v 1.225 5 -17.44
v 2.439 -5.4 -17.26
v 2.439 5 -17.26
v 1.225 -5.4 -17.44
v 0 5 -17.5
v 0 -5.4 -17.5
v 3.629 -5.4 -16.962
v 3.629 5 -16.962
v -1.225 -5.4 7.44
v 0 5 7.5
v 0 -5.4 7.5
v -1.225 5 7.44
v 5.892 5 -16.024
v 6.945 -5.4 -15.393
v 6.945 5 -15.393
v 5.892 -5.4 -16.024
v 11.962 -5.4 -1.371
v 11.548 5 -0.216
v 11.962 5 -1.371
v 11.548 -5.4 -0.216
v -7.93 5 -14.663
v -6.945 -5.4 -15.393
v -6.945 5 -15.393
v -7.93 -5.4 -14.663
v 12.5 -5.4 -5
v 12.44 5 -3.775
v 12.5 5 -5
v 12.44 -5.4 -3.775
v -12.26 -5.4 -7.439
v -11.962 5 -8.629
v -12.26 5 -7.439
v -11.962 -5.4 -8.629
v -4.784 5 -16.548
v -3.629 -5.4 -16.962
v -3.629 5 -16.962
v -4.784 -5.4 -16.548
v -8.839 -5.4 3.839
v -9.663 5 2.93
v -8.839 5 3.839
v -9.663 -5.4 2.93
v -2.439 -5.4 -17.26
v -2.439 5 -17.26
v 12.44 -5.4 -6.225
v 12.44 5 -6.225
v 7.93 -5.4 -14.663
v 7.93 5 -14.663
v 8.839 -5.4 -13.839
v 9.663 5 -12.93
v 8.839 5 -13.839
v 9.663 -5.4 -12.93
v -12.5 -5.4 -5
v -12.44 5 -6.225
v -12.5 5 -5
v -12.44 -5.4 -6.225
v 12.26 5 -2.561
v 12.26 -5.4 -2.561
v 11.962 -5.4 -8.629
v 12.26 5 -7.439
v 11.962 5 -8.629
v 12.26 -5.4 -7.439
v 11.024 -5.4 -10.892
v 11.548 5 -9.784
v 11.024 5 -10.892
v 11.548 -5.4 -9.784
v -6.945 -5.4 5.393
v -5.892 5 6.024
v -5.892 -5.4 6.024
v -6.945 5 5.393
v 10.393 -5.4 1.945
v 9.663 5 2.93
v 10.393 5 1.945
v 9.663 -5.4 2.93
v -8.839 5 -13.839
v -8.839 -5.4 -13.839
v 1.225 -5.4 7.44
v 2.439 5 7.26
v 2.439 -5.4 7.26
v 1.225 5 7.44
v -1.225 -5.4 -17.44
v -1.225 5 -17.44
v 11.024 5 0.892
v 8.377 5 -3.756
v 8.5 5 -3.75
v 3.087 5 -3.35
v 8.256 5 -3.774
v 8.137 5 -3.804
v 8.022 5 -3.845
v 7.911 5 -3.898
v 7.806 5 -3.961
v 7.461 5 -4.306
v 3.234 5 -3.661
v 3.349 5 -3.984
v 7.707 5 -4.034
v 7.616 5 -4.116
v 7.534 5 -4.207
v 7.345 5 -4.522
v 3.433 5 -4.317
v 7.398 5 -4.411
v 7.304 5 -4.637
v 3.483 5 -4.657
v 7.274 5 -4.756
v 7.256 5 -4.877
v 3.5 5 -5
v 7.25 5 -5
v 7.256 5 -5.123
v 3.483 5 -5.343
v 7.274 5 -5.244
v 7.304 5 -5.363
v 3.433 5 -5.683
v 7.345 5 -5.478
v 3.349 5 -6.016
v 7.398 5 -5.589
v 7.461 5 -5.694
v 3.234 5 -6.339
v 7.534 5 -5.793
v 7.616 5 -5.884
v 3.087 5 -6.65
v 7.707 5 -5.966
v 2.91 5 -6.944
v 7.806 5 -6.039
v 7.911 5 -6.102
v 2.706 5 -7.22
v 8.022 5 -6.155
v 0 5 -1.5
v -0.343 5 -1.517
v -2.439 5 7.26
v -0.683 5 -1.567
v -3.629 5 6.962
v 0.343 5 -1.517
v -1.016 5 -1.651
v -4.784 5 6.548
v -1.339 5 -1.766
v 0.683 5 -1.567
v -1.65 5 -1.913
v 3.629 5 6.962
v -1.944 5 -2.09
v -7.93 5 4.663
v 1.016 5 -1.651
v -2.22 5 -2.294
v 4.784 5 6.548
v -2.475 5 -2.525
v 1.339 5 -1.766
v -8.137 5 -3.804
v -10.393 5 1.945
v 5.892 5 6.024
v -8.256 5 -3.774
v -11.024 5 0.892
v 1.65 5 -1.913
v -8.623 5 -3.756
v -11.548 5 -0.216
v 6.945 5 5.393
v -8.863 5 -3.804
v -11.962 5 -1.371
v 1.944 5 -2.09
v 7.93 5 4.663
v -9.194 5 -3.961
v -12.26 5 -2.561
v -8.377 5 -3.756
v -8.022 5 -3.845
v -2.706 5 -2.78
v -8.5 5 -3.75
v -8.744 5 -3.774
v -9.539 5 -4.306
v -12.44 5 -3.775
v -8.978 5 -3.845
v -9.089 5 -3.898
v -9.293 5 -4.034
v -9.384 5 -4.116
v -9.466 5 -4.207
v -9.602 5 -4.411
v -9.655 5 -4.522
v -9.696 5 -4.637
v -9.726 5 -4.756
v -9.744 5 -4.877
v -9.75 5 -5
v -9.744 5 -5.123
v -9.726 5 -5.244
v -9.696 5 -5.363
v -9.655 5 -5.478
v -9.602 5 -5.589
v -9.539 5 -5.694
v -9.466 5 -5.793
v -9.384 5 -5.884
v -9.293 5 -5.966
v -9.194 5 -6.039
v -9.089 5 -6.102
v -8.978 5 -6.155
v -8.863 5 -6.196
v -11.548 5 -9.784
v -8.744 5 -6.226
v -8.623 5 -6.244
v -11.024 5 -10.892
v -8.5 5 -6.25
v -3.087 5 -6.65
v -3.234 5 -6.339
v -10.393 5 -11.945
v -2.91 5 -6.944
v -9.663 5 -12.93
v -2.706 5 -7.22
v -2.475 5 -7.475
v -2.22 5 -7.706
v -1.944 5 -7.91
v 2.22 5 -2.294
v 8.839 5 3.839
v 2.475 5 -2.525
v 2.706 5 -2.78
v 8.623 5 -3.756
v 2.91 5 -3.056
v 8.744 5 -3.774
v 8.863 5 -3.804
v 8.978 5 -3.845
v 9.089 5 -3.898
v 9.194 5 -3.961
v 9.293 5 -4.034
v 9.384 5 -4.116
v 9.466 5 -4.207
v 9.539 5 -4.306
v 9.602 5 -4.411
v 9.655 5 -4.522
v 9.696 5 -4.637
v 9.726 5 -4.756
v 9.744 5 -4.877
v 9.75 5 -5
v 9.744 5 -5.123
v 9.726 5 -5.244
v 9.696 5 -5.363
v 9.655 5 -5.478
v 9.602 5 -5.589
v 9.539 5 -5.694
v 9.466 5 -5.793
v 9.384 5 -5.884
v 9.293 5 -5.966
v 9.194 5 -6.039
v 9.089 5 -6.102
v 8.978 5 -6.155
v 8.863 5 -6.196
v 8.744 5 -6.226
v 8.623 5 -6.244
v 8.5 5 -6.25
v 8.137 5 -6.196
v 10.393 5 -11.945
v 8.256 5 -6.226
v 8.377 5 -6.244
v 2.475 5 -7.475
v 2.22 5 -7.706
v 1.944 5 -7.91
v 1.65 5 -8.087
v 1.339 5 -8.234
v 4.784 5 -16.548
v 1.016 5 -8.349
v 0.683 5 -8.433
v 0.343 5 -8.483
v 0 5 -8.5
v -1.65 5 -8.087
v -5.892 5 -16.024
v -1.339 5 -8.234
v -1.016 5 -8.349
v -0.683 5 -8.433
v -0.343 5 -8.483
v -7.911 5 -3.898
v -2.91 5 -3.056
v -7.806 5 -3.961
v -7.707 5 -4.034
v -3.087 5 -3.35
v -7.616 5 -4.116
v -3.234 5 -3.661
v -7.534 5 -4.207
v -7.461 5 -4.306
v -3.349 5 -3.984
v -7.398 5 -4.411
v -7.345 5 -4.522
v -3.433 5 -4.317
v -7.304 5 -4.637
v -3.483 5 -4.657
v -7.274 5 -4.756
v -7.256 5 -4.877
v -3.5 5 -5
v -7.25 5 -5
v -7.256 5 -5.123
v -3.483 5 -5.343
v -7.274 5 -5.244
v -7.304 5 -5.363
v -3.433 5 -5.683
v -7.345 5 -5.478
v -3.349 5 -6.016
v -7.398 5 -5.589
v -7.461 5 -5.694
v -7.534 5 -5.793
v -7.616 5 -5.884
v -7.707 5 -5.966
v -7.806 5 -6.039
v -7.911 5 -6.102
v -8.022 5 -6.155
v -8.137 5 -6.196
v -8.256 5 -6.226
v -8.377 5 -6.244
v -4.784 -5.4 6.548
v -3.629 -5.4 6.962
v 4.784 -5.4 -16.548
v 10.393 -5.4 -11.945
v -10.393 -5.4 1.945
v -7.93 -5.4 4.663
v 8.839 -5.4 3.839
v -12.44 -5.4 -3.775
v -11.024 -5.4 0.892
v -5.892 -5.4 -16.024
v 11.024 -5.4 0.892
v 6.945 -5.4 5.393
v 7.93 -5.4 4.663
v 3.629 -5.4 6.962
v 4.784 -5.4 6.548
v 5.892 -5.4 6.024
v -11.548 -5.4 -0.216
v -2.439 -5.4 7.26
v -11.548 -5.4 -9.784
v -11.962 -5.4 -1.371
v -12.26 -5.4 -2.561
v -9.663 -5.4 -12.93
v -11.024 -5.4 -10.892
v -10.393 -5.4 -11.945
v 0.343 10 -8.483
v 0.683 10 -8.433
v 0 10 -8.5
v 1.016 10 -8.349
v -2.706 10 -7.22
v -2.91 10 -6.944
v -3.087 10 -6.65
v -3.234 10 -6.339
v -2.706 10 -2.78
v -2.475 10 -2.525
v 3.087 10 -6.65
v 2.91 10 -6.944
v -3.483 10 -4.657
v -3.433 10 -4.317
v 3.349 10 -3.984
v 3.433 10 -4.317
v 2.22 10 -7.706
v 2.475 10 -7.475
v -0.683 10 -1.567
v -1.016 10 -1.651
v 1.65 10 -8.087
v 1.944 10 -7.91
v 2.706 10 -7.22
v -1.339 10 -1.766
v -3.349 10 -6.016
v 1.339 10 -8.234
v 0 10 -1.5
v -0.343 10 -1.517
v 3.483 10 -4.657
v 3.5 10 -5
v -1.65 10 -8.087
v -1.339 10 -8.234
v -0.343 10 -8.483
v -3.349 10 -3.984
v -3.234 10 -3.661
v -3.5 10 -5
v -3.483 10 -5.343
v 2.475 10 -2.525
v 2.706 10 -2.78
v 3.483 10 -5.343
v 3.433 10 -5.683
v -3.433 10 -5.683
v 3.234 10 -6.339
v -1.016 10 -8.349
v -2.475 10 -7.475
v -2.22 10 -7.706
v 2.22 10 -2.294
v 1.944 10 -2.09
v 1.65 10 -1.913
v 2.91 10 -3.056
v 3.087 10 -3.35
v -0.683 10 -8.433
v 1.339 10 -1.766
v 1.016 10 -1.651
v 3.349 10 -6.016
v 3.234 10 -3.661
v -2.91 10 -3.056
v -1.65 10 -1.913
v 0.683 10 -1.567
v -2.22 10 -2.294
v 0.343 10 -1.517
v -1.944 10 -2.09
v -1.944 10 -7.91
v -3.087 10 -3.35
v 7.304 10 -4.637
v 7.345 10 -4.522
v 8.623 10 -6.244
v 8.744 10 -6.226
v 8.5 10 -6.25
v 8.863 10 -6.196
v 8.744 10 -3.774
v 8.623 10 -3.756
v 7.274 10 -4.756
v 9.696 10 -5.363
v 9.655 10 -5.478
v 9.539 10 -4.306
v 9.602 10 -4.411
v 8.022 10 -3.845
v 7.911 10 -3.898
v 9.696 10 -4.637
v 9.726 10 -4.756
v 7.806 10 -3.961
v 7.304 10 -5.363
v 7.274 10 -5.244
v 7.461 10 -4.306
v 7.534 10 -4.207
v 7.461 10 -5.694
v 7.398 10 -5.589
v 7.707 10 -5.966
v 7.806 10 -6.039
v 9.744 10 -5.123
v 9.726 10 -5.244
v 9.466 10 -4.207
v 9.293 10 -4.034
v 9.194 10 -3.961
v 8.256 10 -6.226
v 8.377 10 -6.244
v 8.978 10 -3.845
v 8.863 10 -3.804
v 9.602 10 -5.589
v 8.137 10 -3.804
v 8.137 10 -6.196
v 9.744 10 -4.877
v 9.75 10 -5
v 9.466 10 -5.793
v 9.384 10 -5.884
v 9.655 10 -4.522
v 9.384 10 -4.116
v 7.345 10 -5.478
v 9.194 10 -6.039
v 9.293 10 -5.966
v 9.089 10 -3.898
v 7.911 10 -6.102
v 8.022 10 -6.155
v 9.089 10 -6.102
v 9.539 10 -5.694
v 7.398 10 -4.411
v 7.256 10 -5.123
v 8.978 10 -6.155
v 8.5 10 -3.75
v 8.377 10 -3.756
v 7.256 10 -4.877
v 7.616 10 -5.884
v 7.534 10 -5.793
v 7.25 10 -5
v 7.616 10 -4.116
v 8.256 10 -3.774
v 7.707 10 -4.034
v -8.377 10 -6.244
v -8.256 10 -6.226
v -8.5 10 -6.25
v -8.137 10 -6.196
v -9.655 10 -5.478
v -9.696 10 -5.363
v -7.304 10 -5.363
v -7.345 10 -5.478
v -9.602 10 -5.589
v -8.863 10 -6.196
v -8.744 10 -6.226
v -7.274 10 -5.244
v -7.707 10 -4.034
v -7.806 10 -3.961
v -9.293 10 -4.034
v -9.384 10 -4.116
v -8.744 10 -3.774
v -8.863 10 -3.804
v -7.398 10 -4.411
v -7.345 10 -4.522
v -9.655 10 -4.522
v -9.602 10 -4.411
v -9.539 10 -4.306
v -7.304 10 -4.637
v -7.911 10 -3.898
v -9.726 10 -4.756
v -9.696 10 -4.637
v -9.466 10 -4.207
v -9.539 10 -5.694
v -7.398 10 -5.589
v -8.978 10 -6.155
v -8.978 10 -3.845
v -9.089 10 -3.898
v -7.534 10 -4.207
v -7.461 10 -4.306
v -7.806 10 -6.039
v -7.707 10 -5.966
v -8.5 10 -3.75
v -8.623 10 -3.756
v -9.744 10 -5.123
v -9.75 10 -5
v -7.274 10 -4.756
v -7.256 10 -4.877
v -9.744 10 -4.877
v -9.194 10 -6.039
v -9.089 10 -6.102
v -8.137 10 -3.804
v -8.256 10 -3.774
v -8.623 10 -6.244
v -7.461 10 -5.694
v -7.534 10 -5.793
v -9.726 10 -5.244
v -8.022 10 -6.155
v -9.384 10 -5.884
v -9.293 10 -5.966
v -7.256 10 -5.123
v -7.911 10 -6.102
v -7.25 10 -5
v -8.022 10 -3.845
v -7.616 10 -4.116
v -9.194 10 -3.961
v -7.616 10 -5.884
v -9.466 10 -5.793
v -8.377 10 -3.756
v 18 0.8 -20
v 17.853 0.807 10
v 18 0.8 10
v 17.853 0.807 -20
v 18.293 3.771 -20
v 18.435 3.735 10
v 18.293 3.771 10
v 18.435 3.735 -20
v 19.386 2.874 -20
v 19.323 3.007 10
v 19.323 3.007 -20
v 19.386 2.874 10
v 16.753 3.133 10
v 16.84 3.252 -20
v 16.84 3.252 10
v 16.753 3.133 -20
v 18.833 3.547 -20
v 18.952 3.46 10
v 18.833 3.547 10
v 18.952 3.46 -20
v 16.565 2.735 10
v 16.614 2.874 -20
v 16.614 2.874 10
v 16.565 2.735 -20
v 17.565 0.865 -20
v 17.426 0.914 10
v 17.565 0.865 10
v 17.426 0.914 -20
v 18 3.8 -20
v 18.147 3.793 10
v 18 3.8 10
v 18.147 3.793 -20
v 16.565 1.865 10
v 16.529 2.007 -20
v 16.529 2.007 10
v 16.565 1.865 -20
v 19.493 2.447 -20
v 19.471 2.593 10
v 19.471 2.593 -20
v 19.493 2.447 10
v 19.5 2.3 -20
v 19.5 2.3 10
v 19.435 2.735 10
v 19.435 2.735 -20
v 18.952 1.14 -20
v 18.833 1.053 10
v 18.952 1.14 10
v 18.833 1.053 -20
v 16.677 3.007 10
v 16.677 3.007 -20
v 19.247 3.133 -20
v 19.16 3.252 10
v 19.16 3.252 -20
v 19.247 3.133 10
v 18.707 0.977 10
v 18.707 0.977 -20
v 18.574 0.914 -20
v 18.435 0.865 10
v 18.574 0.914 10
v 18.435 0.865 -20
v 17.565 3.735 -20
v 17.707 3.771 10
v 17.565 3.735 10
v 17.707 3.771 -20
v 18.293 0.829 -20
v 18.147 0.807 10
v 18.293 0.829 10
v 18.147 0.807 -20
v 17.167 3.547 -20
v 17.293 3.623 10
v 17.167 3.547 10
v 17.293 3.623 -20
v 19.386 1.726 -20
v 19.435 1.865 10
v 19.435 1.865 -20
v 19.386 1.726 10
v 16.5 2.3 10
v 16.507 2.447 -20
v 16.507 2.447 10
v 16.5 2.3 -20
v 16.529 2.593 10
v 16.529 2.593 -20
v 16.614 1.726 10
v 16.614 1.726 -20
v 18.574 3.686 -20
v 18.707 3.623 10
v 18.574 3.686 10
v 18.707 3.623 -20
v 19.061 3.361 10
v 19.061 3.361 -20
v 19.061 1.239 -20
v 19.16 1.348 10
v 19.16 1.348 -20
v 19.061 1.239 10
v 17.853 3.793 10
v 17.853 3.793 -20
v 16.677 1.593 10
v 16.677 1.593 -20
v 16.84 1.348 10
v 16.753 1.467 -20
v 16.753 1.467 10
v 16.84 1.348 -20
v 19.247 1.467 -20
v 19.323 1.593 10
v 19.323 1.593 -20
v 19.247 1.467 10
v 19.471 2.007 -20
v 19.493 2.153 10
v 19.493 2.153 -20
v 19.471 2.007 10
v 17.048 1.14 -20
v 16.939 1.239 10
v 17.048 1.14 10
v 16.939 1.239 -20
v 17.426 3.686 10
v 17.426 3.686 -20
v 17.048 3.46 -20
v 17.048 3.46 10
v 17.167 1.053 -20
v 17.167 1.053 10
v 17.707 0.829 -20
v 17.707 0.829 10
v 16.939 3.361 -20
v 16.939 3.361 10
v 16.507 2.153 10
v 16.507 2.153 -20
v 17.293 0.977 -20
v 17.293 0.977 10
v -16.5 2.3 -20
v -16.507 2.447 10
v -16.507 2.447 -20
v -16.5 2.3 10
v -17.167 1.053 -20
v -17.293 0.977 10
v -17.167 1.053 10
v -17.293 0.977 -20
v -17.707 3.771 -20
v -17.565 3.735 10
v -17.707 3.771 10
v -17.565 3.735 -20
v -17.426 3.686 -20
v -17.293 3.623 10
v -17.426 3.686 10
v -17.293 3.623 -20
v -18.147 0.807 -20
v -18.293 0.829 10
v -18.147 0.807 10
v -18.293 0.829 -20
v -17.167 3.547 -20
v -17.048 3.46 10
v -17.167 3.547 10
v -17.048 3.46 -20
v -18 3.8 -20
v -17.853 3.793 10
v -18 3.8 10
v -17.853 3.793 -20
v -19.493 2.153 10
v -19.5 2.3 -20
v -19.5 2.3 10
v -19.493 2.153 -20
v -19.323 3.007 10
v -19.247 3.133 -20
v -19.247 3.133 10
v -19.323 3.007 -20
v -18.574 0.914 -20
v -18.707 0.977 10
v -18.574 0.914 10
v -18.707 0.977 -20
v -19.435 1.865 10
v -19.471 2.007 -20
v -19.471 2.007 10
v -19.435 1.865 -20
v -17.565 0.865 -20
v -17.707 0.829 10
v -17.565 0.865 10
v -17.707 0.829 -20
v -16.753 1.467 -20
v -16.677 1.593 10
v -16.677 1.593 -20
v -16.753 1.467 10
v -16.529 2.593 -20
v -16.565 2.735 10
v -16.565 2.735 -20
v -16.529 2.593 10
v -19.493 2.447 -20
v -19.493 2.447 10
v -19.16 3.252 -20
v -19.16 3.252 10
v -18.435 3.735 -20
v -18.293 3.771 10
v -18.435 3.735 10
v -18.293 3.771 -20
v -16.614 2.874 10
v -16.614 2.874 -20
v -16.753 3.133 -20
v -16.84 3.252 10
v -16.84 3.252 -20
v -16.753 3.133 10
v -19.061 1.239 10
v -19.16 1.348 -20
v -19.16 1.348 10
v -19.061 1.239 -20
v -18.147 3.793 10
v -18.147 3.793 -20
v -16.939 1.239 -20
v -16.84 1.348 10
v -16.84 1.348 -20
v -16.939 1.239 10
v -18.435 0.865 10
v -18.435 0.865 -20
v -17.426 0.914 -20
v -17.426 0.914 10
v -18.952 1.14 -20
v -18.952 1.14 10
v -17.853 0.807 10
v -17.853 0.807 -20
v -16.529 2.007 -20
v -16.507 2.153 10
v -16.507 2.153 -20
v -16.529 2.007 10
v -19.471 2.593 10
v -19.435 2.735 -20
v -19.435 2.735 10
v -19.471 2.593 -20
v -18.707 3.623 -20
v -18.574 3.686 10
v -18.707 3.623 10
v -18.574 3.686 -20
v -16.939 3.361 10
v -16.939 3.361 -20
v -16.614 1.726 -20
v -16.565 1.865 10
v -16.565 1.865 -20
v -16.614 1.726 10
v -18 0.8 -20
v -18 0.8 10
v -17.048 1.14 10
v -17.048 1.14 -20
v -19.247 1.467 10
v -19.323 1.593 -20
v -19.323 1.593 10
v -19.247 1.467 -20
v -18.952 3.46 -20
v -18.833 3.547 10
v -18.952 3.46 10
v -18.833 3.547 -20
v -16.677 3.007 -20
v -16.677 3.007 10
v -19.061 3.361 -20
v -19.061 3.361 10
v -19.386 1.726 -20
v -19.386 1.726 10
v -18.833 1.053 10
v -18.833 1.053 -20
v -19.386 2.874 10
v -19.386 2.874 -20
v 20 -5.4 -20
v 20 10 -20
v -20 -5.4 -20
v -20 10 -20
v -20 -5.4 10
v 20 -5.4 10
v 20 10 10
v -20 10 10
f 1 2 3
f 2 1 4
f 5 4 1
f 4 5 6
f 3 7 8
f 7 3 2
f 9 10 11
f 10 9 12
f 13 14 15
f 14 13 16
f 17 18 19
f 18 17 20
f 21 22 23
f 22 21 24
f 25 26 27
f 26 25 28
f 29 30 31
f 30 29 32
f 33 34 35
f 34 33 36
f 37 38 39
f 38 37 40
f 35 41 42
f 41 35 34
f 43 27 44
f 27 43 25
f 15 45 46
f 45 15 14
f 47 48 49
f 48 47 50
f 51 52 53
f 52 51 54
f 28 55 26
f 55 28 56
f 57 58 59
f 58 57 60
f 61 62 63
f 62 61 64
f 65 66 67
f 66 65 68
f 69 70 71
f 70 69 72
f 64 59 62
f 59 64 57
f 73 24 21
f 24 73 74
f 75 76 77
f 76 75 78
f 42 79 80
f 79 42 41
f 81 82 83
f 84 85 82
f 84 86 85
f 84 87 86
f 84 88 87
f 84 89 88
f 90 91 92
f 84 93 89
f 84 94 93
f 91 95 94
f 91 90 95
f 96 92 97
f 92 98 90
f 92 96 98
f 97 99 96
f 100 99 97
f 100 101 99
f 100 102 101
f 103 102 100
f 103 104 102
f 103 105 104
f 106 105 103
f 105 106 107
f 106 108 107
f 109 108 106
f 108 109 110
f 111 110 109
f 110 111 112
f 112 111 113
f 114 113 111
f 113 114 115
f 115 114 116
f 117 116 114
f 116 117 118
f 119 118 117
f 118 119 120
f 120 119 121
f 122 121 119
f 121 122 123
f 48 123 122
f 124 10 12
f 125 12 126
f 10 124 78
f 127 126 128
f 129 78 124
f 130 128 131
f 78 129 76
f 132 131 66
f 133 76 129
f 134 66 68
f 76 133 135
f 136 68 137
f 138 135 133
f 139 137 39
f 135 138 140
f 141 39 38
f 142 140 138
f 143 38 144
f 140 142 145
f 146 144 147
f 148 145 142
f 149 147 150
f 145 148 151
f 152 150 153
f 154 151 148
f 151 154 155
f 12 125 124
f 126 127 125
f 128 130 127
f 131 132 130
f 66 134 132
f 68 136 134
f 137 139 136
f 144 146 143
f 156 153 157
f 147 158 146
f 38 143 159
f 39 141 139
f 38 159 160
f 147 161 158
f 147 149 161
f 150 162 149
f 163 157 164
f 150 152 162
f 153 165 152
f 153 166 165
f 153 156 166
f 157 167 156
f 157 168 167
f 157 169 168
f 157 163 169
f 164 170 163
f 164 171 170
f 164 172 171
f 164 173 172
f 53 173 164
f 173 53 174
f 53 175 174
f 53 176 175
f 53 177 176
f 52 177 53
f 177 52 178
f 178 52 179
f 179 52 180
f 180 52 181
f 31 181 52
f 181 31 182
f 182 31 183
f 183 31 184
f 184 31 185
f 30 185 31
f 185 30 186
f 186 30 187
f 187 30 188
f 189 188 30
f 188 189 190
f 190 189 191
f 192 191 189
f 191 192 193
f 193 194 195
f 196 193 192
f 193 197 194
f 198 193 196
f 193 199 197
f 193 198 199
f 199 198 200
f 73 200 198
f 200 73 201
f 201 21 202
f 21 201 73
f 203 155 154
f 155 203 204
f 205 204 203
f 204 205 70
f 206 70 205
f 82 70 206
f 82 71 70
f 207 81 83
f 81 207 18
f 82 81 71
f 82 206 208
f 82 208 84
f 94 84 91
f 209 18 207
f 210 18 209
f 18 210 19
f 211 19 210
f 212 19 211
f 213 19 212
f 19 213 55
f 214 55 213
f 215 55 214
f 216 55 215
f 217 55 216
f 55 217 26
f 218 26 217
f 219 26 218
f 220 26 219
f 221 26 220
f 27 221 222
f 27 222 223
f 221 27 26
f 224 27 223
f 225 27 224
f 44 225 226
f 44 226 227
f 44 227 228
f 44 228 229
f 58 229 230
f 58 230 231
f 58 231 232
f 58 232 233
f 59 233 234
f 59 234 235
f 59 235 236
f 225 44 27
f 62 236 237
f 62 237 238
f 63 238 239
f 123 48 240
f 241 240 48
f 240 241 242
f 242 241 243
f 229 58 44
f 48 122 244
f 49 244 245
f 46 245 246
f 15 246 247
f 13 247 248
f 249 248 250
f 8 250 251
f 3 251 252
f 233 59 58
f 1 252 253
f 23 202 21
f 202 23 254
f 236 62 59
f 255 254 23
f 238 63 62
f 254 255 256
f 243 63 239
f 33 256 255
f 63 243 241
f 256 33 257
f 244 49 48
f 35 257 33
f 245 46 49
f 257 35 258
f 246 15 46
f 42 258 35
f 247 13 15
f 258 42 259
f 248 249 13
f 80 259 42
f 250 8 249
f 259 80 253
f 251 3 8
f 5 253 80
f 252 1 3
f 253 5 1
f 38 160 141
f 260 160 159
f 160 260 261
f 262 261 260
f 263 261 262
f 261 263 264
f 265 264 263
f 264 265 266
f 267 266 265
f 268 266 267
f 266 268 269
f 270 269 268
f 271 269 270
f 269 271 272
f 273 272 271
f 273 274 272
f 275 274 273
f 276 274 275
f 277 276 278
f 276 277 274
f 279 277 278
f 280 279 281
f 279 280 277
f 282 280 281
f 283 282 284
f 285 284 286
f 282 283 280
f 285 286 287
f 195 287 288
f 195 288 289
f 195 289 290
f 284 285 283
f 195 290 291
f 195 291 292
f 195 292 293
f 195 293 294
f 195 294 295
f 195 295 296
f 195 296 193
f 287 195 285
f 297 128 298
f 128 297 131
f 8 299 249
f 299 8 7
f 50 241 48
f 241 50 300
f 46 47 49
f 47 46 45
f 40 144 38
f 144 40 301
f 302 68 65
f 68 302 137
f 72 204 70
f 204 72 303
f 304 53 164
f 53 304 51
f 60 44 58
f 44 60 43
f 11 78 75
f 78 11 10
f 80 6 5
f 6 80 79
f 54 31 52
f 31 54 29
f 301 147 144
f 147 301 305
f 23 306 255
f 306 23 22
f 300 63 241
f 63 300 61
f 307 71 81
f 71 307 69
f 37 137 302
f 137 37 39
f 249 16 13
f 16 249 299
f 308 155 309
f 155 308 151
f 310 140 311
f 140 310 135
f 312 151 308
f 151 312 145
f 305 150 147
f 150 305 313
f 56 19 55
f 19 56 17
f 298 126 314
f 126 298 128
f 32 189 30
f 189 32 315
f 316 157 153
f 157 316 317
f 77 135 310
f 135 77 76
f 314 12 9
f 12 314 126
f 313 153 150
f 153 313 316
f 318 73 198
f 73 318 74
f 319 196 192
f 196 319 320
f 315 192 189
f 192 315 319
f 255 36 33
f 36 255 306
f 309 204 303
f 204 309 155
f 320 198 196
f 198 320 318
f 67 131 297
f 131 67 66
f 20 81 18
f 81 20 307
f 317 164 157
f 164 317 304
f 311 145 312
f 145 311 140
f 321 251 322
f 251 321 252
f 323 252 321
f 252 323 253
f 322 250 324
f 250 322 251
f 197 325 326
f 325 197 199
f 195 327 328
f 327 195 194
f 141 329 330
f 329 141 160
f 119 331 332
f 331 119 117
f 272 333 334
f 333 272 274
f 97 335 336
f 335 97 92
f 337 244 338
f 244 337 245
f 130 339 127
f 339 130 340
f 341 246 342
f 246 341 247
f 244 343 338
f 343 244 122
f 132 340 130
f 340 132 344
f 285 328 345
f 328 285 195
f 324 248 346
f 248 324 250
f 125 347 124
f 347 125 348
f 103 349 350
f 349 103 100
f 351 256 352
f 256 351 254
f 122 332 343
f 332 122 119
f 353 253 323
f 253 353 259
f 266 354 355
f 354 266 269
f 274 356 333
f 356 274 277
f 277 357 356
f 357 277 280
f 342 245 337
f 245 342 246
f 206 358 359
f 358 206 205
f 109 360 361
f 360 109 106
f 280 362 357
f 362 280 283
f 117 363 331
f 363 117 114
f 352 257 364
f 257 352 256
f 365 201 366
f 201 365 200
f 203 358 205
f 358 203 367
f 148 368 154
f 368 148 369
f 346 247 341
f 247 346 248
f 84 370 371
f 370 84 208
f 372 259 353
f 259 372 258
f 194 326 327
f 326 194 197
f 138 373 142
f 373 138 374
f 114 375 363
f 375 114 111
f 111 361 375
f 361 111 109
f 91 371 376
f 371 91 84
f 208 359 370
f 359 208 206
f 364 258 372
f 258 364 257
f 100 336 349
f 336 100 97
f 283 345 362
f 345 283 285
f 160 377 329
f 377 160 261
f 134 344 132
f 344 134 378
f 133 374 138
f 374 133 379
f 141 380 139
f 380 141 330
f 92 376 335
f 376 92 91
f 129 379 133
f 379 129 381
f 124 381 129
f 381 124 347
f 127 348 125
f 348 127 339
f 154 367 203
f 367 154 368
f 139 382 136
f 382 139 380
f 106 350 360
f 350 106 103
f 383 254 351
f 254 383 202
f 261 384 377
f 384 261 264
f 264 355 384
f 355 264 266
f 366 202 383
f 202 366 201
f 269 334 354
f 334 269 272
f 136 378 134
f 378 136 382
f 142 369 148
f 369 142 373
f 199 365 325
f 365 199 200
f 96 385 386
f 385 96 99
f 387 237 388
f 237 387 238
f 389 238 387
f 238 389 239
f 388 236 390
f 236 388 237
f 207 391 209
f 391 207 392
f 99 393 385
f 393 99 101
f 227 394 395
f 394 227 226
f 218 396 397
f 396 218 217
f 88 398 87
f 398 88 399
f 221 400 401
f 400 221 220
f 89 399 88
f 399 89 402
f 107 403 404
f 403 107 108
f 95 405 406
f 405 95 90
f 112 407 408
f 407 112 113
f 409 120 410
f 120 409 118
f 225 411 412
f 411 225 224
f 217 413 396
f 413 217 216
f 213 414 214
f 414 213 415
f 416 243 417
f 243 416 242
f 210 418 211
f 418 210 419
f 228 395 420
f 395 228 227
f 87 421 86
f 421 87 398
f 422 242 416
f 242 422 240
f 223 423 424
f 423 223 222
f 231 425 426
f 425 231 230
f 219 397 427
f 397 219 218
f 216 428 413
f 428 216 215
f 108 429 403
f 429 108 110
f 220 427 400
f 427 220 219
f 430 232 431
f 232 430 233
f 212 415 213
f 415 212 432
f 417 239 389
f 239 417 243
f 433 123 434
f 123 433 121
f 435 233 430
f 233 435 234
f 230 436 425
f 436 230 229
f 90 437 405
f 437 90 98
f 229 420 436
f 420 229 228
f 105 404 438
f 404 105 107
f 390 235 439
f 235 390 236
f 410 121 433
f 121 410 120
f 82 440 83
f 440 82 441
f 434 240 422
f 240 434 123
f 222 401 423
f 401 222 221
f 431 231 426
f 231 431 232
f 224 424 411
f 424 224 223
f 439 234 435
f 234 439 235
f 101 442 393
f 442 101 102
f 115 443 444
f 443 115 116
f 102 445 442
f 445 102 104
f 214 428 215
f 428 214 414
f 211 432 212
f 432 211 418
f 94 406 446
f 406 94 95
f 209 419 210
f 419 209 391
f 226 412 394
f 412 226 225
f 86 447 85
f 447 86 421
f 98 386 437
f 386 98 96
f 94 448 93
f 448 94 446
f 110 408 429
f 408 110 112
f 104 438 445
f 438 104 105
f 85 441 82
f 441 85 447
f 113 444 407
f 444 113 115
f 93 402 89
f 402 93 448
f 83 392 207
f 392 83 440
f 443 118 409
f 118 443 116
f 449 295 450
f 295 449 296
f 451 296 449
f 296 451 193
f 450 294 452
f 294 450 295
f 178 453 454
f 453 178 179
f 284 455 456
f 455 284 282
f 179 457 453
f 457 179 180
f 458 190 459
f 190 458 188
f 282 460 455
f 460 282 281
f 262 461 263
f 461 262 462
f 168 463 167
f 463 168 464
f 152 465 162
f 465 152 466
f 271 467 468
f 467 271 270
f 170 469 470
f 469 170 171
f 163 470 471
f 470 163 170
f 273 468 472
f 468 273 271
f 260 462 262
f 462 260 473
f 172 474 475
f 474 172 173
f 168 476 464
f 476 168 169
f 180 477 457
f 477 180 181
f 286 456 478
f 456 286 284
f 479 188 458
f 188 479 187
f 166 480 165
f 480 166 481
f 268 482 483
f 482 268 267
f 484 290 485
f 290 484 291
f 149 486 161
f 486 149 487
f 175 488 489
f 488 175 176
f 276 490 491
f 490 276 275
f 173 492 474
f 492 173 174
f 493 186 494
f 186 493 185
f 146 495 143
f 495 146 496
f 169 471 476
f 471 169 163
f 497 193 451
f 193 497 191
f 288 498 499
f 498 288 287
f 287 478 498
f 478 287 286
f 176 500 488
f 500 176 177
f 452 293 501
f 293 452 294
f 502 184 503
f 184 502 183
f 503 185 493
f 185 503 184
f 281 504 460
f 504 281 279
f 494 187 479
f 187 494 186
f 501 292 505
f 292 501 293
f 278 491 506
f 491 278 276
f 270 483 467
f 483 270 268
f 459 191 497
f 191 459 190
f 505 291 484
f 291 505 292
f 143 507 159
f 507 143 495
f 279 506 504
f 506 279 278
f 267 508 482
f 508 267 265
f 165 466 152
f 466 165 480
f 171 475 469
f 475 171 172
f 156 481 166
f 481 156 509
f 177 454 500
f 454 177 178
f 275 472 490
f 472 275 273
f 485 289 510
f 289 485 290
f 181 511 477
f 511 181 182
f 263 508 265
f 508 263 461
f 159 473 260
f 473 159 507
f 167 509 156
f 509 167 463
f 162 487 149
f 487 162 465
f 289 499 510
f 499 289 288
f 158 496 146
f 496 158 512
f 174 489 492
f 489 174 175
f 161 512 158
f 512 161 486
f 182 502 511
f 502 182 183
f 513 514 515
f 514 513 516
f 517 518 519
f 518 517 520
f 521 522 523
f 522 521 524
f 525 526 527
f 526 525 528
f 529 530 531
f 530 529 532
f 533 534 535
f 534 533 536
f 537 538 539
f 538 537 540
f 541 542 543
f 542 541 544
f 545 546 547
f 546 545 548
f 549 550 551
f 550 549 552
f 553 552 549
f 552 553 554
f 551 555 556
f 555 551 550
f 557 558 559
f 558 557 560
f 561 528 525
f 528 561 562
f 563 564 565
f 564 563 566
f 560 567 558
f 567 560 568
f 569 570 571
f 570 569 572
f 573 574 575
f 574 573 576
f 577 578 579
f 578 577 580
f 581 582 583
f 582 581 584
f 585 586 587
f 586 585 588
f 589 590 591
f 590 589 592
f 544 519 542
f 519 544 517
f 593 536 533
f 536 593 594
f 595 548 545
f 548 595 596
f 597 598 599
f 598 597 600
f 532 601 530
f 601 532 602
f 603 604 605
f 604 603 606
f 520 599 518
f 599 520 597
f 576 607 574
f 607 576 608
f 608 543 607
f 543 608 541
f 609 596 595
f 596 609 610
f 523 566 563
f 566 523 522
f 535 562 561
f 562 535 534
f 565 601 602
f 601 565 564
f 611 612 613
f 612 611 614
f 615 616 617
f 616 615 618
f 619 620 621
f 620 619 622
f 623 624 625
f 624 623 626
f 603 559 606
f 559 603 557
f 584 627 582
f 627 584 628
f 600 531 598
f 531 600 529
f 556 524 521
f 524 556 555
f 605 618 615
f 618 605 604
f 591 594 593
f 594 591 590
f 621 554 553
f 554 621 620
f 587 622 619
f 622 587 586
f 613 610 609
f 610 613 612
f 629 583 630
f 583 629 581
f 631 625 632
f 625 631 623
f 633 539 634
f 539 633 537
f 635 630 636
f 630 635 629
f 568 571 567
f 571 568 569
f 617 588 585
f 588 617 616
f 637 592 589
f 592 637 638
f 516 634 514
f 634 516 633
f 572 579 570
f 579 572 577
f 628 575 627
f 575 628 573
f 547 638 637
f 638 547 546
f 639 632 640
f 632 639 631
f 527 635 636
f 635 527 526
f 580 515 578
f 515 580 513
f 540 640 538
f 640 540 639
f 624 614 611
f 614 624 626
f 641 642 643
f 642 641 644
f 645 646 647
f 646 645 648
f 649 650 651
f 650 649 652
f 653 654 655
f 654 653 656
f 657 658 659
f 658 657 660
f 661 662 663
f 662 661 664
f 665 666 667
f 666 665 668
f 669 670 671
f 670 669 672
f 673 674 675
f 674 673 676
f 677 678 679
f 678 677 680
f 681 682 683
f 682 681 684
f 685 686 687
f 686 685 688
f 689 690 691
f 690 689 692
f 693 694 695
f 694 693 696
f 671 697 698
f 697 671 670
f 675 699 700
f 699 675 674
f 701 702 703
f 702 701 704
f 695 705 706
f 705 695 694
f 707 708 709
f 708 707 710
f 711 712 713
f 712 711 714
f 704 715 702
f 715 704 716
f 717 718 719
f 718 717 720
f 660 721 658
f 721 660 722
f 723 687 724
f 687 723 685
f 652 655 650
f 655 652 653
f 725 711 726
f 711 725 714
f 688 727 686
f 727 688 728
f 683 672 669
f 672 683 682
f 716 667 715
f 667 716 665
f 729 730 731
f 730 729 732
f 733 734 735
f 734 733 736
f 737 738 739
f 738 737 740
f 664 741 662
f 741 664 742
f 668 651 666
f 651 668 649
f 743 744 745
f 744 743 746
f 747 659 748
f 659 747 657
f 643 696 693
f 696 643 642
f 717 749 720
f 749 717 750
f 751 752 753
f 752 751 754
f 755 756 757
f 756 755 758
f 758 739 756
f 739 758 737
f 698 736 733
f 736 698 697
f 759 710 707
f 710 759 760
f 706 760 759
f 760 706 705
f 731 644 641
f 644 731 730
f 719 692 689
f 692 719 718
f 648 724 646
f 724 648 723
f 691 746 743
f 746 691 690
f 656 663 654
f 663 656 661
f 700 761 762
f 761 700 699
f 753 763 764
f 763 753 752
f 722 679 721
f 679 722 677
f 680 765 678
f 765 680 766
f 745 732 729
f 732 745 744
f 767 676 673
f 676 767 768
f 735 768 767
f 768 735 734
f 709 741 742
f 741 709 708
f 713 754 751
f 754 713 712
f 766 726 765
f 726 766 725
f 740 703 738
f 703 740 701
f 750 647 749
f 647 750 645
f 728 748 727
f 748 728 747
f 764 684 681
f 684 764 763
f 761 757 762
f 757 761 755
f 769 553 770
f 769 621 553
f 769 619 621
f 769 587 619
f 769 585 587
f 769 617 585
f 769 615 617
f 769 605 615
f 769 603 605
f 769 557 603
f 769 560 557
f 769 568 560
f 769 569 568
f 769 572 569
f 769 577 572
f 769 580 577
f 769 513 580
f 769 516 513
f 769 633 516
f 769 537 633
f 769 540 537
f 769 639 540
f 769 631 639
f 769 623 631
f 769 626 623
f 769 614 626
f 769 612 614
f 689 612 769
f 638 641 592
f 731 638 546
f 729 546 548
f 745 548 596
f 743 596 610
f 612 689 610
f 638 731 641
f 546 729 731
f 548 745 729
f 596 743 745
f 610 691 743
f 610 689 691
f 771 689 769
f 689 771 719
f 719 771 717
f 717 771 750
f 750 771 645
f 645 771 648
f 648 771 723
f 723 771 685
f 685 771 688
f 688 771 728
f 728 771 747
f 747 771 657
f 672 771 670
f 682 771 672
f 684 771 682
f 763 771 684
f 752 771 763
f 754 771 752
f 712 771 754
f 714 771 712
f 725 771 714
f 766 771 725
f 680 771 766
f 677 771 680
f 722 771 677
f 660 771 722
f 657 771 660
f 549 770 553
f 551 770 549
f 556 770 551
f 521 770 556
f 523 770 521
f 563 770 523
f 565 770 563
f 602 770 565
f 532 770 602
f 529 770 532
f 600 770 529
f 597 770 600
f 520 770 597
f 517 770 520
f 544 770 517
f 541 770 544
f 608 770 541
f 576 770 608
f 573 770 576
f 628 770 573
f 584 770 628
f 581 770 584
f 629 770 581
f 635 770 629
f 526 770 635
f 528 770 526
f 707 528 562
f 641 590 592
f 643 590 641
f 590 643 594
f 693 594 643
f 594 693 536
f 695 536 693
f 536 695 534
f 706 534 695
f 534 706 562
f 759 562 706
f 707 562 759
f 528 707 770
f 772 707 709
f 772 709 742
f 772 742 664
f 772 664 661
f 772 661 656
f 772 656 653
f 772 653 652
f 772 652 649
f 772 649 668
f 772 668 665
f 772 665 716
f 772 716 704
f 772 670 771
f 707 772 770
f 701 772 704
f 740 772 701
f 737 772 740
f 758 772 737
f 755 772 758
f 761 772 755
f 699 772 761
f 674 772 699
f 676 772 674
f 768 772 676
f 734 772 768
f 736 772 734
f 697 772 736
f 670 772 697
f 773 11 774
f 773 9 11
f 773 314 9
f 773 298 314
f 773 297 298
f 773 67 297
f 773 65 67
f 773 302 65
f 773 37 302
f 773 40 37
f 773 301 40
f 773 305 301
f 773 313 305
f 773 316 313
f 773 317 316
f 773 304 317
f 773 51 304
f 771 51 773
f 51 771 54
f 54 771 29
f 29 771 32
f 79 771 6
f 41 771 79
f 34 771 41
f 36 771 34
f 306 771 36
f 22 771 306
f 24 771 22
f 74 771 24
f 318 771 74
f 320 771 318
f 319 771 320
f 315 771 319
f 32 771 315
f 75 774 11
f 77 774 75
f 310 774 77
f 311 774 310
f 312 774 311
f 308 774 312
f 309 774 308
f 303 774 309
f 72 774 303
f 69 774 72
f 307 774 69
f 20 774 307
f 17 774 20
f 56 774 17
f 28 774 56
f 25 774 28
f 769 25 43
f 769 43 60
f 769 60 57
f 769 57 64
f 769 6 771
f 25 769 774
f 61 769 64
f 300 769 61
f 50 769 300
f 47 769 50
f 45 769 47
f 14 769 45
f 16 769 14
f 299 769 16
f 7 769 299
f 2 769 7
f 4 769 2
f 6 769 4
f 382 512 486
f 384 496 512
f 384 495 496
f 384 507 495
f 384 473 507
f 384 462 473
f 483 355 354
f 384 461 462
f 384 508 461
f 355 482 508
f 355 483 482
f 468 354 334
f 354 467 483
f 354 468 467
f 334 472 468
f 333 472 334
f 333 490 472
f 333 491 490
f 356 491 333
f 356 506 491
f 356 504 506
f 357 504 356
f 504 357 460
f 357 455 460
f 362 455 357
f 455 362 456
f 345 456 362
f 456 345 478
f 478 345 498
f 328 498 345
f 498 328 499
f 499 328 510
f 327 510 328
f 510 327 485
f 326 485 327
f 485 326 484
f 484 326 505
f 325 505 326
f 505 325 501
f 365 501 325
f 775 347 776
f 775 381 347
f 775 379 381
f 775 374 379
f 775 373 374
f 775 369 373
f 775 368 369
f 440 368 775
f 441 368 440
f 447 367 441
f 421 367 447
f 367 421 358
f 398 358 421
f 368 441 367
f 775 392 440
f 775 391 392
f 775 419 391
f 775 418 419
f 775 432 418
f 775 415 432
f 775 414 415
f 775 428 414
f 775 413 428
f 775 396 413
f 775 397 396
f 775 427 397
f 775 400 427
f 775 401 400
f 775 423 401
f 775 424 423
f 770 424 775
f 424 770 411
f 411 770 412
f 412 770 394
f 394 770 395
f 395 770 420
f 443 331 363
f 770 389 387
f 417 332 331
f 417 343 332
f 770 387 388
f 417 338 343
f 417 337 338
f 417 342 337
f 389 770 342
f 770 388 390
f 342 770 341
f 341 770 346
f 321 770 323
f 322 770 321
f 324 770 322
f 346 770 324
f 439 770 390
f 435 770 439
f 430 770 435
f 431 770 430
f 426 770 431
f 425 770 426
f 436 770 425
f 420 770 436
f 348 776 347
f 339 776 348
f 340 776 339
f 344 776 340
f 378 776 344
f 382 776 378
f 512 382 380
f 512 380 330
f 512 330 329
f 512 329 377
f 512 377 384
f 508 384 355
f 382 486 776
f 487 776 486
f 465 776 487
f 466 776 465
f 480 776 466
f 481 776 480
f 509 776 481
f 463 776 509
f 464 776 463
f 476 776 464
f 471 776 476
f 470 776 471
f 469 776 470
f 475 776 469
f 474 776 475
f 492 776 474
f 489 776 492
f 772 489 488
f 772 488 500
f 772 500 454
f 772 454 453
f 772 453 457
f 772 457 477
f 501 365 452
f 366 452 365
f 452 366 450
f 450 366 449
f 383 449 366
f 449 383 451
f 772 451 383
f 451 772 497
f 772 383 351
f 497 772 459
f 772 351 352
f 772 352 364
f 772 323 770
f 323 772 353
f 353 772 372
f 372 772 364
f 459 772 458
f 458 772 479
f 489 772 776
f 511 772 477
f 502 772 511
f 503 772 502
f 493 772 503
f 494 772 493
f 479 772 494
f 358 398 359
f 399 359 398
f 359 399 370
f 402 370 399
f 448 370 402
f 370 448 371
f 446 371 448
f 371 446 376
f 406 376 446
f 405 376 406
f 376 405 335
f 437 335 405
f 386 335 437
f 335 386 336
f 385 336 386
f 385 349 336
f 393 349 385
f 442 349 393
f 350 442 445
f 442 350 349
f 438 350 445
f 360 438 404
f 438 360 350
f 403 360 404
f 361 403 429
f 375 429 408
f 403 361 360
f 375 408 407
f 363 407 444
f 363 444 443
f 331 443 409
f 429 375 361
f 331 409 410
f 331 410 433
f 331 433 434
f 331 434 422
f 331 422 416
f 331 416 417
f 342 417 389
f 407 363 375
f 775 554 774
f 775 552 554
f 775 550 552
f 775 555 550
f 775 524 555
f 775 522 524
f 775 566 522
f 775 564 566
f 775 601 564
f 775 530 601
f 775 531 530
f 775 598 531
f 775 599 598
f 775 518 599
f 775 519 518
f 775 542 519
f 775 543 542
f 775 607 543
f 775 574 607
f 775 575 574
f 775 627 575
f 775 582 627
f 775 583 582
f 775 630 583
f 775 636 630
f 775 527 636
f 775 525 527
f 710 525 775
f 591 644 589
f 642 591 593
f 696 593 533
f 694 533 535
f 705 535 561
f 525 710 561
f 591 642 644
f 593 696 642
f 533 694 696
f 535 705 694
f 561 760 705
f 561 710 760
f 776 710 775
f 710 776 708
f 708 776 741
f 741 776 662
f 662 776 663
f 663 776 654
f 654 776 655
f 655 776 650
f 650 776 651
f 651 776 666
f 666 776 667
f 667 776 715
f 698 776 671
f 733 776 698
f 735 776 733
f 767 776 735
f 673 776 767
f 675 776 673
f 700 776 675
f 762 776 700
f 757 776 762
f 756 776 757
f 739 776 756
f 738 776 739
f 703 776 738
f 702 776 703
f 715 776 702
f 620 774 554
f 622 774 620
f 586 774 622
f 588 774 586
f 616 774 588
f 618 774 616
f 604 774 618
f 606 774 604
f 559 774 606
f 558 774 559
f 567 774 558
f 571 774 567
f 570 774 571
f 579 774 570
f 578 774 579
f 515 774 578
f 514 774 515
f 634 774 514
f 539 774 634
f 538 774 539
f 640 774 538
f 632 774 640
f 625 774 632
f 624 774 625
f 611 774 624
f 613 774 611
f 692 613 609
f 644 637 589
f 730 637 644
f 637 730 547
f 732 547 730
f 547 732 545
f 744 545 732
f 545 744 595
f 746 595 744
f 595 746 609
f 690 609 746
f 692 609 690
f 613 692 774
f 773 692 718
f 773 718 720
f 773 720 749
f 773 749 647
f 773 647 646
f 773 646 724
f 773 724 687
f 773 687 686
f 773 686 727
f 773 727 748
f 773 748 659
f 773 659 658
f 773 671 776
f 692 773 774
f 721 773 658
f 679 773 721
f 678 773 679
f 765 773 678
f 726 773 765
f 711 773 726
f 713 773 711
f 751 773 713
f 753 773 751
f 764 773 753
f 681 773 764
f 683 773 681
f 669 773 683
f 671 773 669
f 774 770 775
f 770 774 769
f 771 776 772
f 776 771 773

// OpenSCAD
// file: dc_motor_mount.scad
motor_diameter = 25;
motor_height = 30.8;
motor_shaft_d = 7;
motor_shaft_length = 12;

bogie_width=50-10;
bogie_height=40-10;

motor_mount_thickness=motor_height/2;


motor_mount();

module motor_mount() {
  $fn = 64;
  difference() {
    cube(size=[bogie_height, bogie_width, motor_mount_thickness], center=false);
    translate([bogie_height/2, bogie_width/2, 0]) {
      translate([0, 0, 5]) {
        cylinder(d=motor_diameter, h=motor_height+2, center=false);
      }
      translate([0, 0, -1]) {
        cylinder(d=motor_shaft_d, h=motor_shaft_length, center=false);
      }
      translate([0, 8.5, -1]) {
        cylinder(d=2.5, h=20, center=false);
      }
      translate([0, -8.5, -1]) {
        cylinder(d=2.5, h=20, center=false);
      }
      translate([0, 18, motor_mount_thickness/2]) {
        rotate([0, 90, 0]) {
          cylinder(d=3, h=50, center=true);
        }
      }
      translate([0, -18, motor_mount_thickness/2]) {
        rotate([0, 90, 0]) {
          cylinder(d=3, h=50, center=true);
        }
      }
    }
  }
}
// main file
   
 use <dc_motor.scad>
use <dc_motor_mount.scad>
use <Gears.scad>

bogie_width = 50; // 60
bogie_length = 100;
bogie_height = 45; // 50
bogie_wall_width = 10;

module switch_bogie(bogie_width,bogie_length,bogie_height,bogie_wall_width,at_center) {
  difference() {
    minkowski() {
      cube([bogie_width, bogie_length, bogie_height+5], center=at_center);
      sphere(r=1);
    }
    // make room for 3 switches 
     translate([0,0,-bogie_height/2]){ 
        cube([6,20,8], center=at_center);
     }
      translate([15,0,-bogie_height/2]){ 
        cube([6,20,8], center=at_center);
     }
     
     translate([-15,0,-bogie_height/2]){ 
        cube([6,20,8], center=at_center);
     }
     
     // making room for switch mounts 
      translate([0,5,-bogie_height/2]){ 
         rotate([90,0,90])   cylinder(r=2, h=40, center=at_center, $fn=128);
     }
     
          // making room for switch mounts 
      translate([0,-5,-bogie_height/2]){ 
         rotate([90,0,90])   cylinder(r=2, h=40, center=at_center, $fn=128);
     }
     
      // Chop off top
      translate([0, 0, bogie_height]) cube([bogie_width + 10, bogie_length + 10, bogie_height+10], center=at_center);

      // Hollow
      cube([bogie_width-bogie_wall_width, bogie_length-bogie_wall_width, bogie_height-bogie_wall_width+10], center=at_center);

      translate([0,0,20]) {
        cube([bogie_width-bogie_wall_width+6, bogie_length-bogie_wall_width+6, 15], center=at_center);
      }

      translate([0, 30, -5]) {
        drive_axle();
      }

      translate([0, -30, -5]) {
        drive_axle();
    }
  }

}

// Motor mount
translate([-20, 10, 10]) {
  rotate([90, 90, 0]) {
    motor_mount();
  }
  //dc_enginge_mount();
}

translate([-100, 0, 0]) {
  gear_axle();
}

module dc_enginge_mount() {
  difference() {
    cube(size=[bogie_width, 20, 15], center=true);
    translate([0, -15, 5]) {
      rotate([0, 0, 90]) {
        hobby_dc_motor();
      }
    }
    translate([15, 0, 0]) {
      cylinder(r=3, h=20, center=true);
    }
    translate([-15, 0, 0]) {
      cylinder(r=3, h=20, center=true);
    }
  }

  translate([0, -15, 5]) {
      rotate([0, 0, 90]) {
        hobby_dc_motor();
      }
    }
}

module drive_axle() {
  rotate([0, 90, 0]) {
    cylinder(r=10, h=70, center=true);
  }

}

module screw_pole() {
  difference() {
    cube(size=[5, 5, 30], center=true);
    cylinder(r=1.5, h=45, center=true);
  }
}

module gr_1(n=0,thk=0){
    r = n*1.5;

module tooth(){
    sz = 5;
    sx = 3;
    th = thk;
    of = 5;

    hull(){
    translate([0,0,th/2])
    cube([sz,sz,th],center=true);
    translate([of,0,th/2])
    cube([sx,sx,th],center=true);}}

    for(i=[0:n]) //n is number of teeth
    rotate([0,0,i*360/n])
    translate([r,0,0])
    tooth();

    cylinder(r=r,h=thk);}

module gear(n=0,thk=0,sc=0){
    sc = sc*0.0204;
    scale(sc)
    gr_1(n=n,thk=thk);}

module gear_axle() {
  difference() {
    gear(24,15,10);
    rotate([0, 90, 0]) {
      drive_axle();
    }
  }
}



    // switch_bogie(
    //     bogie_width,
    //     bogie_length,
    //     bogie_height,
    //     bogie_wall_width,
    //     true
    //     );
